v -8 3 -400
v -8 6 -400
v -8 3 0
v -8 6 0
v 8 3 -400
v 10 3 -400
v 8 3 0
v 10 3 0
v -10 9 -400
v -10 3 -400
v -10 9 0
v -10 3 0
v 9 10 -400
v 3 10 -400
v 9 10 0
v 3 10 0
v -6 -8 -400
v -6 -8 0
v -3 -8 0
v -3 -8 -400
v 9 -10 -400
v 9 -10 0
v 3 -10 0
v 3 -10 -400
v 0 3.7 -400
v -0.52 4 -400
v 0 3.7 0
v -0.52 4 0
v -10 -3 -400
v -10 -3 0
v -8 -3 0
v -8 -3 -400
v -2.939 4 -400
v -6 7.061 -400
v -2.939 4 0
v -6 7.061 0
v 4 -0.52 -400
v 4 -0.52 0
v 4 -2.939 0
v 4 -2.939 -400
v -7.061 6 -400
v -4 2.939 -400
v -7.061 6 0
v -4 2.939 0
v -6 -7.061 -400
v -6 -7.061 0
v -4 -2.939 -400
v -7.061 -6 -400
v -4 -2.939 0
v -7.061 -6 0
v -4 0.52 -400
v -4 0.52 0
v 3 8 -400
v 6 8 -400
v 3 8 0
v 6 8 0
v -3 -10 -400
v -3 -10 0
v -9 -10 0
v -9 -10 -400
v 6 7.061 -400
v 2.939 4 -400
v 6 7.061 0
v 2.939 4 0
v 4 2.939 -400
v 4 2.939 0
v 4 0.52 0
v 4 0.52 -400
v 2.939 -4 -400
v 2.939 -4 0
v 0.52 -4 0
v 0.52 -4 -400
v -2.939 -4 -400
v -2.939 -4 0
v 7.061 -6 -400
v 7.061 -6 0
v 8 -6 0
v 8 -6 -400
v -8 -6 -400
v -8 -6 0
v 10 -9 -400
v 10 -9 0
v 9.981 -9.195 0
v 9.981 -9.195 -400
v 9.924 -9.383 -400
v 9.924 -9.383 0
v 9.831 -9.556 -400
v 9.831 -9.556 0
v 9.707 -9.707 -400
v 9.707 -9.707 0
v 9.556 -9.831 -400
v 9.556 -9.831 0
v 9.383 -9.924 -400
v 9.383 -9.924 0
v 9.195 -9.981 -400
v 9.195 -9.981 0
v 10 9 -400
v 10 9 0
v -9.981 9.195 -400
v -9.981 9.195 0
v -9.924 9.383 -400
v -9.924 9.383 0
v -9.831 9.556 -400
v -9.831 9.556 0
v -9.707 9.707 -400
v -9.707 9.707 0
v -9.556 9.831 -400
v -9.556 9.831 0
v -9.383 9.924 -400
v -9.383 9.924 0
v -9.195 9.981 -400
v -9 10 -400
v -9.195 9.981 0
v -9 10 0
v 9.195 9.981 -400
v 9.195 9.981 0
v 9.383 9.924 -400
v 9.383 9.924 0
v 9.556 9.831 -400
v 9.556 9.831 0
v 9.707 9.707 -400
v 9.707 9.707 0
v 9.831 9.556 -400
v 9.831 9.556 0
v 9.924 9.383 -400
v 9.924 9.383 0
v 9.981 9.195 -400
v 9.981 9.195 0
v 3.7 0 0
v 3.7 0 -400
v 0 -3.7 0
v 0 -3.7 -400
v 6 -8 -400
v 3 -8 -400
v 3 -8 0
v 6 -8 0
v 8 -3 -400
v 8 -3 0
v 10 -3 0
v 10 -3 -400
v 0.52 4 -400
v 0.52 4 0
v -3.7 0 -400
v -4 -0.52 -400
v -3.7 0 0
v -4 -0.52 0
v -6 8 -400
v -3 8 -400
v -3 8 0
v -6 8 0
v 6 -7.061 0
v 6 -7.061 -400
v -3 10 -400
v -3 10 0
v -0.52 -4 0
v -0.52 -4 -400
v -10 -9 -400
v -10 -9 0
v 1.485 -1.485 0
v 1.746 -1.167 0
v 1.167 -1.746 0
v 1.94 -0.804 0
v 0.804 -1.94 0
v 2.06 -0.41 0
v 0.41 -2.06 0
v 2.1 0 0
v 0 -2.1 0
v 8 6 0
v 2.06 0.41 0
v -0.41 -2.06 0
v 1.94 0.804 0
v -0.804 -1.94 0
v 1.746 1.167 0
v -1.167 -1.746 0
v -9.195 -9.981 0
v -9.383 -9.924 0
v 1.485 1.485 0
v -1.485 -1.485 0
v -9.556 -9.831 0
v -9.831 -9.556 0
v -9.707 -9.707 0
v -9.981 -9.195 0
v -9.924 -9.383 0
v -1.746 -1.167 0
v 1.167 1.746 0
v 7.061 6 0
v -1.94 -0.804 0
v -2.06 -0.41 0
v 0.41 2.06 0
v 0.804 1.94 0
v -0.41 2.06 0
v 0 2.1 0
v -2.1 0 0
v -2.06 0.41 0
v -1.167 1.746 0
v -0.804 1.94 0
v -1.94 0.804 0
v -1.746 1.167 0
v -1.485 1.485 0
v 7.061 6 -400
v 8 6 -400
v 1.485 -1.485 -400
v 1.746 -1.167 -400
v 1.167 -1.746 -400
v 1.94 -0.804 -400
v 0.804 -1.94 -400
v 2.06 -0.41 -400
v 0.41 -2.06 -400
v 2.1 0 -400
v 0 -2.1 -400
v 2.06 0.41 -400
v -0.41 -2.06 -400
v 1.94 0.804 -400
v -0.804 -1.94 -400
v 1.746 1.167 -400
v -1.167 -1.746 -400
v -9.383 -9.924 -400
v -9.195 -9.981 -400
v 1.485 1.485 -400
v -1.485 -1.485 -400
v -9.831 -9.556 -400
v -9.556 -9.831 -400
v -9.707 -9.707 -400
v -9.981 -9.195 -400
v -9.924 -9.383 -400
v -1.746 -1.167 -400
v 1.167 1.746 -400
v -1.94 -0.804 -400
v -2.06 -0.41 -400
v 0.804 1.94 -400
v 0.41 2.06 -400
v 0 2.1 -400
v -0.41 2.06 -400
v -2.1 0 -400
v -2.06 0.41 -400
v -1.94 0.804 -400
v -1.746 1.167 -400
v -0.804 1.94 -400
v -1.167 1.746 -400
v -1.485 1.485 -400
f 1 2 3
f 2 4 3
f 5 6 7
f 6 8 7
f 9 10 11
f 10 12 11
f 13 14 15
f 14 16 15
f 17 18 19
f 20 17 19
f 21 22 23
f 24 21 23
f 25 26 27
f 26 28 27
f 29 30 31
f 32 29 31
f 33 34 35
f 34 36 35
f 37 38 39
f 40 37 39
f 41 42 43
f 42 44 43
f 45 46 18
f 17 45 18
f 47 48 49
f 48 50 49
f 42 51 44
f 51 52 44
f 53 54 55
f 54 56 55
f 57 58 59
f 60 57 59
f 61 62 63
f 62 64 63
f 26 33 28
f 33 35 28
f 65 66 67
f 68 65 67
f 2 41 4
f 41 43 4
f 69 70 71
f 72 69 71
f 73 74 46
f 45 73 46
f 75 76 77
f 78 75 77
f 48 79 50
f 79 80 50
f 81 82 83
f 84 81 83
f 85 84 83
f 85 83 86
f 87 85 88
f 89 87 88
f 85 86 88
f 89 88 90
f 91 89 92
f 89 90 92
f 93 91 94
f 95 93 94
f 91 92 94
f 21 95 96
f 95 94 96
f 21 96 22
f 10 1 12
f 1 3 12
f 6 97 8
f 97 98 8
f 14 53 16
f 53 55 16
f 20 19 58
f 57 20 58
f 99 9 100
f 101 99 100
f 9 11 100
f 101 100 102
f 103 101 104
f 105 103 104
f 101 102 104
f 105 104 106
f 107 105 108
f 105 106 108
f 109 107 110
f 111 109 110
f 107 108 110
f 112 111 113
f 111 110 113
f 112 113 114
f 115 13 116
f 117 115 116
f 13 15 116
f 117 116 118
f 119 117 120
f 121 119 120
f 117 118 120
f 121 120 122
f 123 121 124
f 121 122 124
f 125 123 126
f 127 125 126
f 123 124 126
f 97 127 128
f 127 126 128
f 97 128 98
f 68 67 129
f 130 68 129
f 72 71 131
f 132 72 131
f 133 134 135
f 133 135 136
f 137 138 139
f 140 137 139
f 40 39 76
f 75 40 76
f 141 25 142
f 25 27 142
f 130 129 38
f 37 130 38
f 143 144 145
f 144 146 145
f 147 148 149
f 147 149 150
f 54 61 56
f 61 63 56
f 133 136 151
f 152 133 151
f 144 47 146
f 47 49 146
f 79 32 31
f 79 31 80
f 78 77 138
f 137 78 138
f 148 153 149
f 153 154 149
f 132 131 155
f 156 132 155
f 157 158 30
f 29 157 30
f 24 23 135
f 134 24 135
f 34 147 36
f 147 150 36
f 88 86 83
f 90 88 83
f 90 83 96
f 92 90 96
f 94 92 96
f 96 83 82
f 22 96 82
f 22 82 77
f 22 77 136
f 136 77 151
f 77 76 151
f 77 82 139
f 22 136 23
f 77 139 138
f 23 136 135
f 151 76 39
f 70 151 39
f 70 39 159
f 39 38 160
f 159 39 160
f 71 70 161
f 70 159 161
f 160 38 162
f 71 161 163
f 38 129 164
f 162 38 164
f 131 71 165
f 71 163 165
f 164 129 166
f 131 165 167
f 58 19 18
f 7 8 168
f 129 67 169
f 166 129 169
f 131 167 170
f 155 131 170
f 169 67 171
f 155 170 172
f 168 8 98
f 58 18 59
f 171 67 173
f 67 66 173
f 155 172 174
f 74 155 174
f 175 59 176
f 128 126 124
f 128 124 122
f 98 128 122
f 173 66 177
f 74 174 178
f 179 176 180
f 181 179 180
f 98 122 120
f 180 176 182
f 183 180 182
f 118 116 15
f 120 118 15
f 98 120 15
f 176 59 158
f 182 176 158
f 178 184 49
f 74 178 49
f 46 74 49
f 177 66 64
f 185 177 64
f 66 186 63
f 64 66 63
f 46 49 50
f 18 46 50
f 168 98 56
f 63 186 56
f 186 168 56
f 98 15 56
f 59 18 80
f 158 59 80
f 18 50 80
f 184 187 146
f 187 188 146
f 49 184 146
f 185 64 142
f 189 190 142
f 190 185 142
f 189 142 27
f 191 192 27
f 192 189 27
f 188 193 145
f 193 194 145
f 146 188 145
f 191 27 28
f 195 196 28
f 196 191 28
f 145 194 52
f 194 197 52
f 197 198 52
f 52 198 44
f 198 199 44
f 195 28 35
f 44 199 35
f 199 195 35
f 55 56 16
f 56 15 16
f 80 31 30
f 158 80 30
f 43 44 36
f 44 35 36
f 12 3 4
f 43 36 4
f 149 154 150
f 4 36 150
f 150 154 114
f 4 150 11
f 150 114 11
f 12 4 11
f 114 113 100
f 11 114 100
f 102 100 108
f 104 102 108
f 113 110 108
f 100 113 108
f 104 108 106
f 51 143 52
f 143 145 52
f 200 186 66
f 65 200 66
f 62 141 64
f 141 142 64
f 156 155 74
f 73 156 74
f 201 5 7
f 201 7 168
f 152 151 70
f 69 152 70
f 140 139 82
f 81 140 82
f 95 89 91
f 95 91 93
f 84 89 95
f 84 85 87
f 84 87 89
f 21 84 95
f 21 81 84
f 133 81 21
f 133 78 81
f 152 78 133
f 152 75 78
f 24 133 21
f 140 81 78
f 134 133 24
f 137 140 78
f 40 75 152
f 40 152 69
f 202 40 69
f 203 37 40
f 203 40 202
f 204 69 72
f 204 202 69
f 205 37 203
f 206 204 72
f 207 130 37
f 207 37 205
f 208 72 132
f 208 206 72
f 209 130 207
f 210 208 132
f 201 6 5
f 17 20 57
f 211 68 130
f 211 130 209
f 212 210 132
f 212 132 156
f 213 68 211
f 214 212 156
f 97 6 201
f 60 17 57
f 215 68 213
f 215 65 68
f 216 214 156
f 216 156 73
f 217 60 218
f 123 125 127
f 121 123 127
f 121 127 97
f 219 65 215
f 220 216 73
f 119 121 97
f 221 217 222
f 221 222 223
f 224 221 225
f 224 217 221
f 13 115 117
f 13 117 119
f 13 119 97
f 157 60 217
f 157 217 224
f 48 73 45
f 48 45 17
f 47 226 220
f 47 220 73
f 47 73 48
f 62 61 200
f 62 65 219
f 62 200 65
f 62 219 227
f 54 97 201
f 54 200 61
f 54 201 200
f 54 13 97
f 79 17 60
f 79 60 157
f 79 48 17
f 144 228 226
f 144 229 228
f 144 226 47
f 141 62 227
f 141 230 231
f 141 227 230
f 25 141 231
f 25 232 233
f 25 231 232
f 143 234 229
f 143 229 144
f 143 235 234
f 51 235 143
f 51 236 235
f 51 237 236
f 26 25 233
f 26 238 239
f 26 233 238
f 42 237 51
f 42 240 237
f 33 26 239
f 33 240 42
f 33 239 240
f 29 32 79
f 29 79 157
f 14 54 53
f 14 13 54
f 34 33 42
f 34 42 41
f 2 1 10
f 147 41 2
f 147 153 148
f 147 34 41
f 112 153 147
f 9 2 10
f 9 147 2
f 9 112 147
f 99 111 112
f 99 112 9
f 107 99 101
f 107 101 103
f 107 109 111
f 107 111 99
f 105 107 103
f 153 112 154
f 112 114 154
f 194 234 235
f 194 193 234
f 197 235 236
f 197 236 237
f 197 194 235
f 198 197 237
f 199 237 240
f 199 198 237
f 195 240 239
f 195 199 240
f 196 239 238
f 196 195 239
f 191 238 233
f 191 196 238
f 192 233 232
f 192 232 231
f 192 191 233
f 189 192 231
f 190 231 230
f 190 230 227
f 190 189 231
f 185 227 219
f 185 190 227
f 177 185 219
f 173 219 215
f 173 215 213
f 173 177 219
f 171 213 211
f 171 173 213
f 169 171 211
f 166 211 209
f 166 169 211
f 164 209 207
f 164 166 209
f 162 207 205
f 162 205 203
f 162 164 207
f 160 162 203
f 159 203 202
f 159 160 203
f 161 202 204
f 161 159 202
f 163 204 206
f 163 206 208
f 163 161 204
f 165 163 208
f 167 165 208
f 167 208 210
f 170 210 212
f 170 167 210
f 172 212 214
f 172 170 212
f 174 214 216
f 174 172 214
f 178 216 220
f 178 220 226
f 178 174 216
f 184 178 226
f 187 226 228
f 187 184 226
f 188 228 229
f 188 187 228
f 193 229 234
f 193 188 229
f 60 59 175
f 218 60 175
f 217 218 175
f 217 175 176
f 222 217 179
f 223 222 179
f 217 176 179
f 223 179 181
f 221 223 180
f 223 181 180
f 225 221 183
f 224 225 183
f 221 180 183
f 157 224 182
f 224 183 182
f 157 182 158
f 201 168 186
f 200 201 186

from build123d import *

# Parameters (mm, degrees)
SKETCH1_R           = 2.1
BOSS_EXTRUDE1_DEPTH = 350
SKETCH2_R           = 2.1
BOSS_EXTRUDE2_DEPTH = 50


with BuildPart() as part:
    # Sketch1 → Boss-Extrude1 (new body)
    with BuildSketch(Plane(origin=(0, 0, -350), x_dir=(-1, 0, 0), z_dir=(0, 0, -1))):
        with BuildLine():
            Line((8, -3), (8, -6))
            Line((8, -6), (7.060660172, -6))
            Line((7.060660172, -6), (4, -2.939339828))
            Line((4, -2.939339828), (4, -0.519615242))
            Line((4, -0.519615242), (3.7, 0))
            Line((3.7, 0), (4, 0.519615242))
            Line((4, 0.519615242), (4, 2.939339828))
            Line((4, 2.939339828), (7.060660172, 6))
            Line((7.060660172, 6), (8, 6))
            Line((8, 6), (8, 3))
            Line((8, 3), (10, 3))
            Line((10, 3), (10, 9))
            ThreePointArc((10, 9), (9.707106781, 9.707106781), (9, 10))
            Line((9, 10), (3, 10))
            Line((3, 10), (3, 8))
            Line((3, 8), (6, 8))
            Line((6, 8), (6, 7.060660172))
            Line((6, 7.060660172), (2.939339828, 4))
            Line((2.939339828, 4), (0.519615242, 4))
            Line((0.519615242, 4), (0, 3.7))
            Line((0, 3.7), (-0.519615242, 4))
            Line((-0.519615242, 4), (-2.939339828, 4))
            Line((-2.939339828, 4), (-6, 7.060660172))
            Line((-6, 7.060660172), (-6, 8))
            Line((-6, 8), (-3, 8))
            Line((-3, 8), (-3, 10))
            Line((-3, 10), (-9, 10))
            ThreePointArc((-9, 10), (-9.707106781, 9.707106781), (-10, 9))
            Line((-10, 9), (-10, 3))
            Line((-10, 3), (-8, 3))
            Line((-8, 3), (-8, 6))
            Line((-8, 6), (-7.060660172, 6))
            Line((-7.060660172, 6), (-4, 2.939339828))
            Line((-4, 2.939339828), (-4, 0.519615242))
            Line((-4, 0.519615242), (-3.7, 0))
            Line((-3.7, 0), (-4, -0.519615242))
            Line((-4, -0.519615242), (-4, -2.939339828))
            Line((-4, -2.939339828), (-7.060660172, -6))
            Line((-7.060660172, -6), (-8, -6))
            Line((-8, -6), (-8, -3))
            Line((-8, -3), (-10, -3))
            Line((-10, -3), (-10, -9))
            ThreePointArc((-10, -9), (-9.707106781, -9.707106781), (-9, -10))
            Line((-9, -10), (-3, -10))
            Line((-3, -10), (-3, -8))
            Line((-3, -8), (-6, -8))
            Line((-6, -8), (-6, -7.060660172))
            Line((-6, -7.060660172), (-2.939339828, -4))
            Line((-2.939339828, -4), (-0.519615242, -4))
            Line((-0.519615242, -4), (0, -3.7))
            Line((0, -3.7), (0.519615242, -4))
            Line((0.519615242, -4), (2.939339828, -4))
            Line((2.939339828, -4), (6, -7.060660172))
            Line((6, -7.060660172), (6, -8))
            Line((6, -8), (3, -8))
            Line((3, -8), (3, -10))
            Line((3, -10), (9, -10))
            ThreePointArc((9, -10), (9.707106781, -9.707106781), (10, -9))
            Line((10, -9), (10, -3))
            Line((10, -3), (8, -3))
        make_face()
        Circle(SKETCH1_R, mode=Mode.SUBTRACT)
    extrude(amount=-BOSS_EXTRUDE1_DEPTH)

    # Sketch2 → Boss-Extrude2 (add)
    with BuildSketch(Plane(origin=(0, 0, -350), x_dir=(-1, 0, 0), z_dir=(0, 0, -1))):
        with BuildLine():
            Line((10, -3), (8, -3))
            Line((8, -3), (8, -6))
            Line((8, -6), (7.060660172, -6))
            Line((7.060660172, -6), (4, -2.939339828))
            Line((4, -2.939339828), (4, -0.519615242))
            Line((4, -0.519615242), (3.7, 0))
            Line((3.7, 0), (4, 0.519615242))
            Line((4, 0.519615242), (4, 2.939339828))
            Line((4, 2.939339828), (7.060660172, 6))
            Line((7.060660172, 6), (8, 6))
            Line((8, 6), (8, 3))
            Line((8, 3), (10, 3))
            Line((10, 3), (10, 9))
            ThreePointArc((10, 9), (9.707106781, 9.707106781), (9, 10))
            Line((9, 10), (3, 10))
            Line((3, 10), (3, 8))
            Line((3, 8), (6, 8))
            Line((6, 8), (6, 7.060660172))
            Line((6, 7.060660172), (2.939339828, 4))
            Line((2.939339828, 4), (0.519615242, 4))
            Line((0.519615242, 4), (0, 3.7))
            Line((0, 3.7), (-0.519615242, 4))
            Line((-0.519615242, 4), (-2.939339828, 4))
            Line((-2.939339828, 4), (-6, 7.060660172))
            Line((-6, 7.060660172), (-6, 8))
            Line((-6, 8), (-3, 8))
            Line((-3, 8), (-3, 10))
            Line((-3, 10), (-9, 10))
            ThreePointArc((-9, 10), (-9.707106781, 9.707106781), (-10, 9))
            Line((-10, 9), (-10, 3))
            Line((-10, 3), (-8, 3))
            Line((-8, 3), (-8, 6))
            Line((-8, 6), (-7.060660172, 6))
            Line((-7.060660172, 6), (-4, 2.939339828))
            Line((-4, 2.939339828), (-4, 0.519615242))
            Line((-4, 0.519615242), (-3.7, 0))
            Line((-3.7, 0), (-4, -0.519615242))
            Line((-4, -0.519615242), (-4, -2.939339828))
            Line((-4, -2.939339828), (-7.060660172, -6))
            Line((-7.060660172, -6), (-8, -6))
            Line((-8, -6), (-8, -3))
            Line((-8, -3), (-10, -3))
            Line((-10, -3), (-10, -9))
            ThreePointArc((-10, -9), (-9.707106781, -9.707106781), (-9, -10))
            Line((-9, -10), (-3, -10))
            Line((-3, -10), (-3, -8))
            Line((-3, -8), (-6, -8))
            Line((-6, -8), (-6, -7.060660172))
            Line((-6, -7.060660172), (-2.939339828, -4))
            Line((-2.939339828, -4), (-0.519615242, -4))
            Line((-0.519615242, -4), (0, -3.7))
            Line((0, -3.7), (0.519615242, -4))
            Line((0.519615242, -4), (2.939339828, -4))
            Line((2.939339828, -4), (6, -7.060660172))
            Line((6, -7.060660172), (6, -8))
            Line((6, -8), (3, -8))
            Line((3, -8), (3, -10))
            Line((3, -10), (9, -10))
            ThreePointArc((9, -10), (9.707106781, -9.707106781), (10, -9))
            Line((10, -9), (10, -3))
        make_face()
        Circle(SKETCH2_R, mode=Mode.SUBTRACT)
    extrude(amount=BOSS_EXTRUDE2_DEPTH)


solid = part.part
